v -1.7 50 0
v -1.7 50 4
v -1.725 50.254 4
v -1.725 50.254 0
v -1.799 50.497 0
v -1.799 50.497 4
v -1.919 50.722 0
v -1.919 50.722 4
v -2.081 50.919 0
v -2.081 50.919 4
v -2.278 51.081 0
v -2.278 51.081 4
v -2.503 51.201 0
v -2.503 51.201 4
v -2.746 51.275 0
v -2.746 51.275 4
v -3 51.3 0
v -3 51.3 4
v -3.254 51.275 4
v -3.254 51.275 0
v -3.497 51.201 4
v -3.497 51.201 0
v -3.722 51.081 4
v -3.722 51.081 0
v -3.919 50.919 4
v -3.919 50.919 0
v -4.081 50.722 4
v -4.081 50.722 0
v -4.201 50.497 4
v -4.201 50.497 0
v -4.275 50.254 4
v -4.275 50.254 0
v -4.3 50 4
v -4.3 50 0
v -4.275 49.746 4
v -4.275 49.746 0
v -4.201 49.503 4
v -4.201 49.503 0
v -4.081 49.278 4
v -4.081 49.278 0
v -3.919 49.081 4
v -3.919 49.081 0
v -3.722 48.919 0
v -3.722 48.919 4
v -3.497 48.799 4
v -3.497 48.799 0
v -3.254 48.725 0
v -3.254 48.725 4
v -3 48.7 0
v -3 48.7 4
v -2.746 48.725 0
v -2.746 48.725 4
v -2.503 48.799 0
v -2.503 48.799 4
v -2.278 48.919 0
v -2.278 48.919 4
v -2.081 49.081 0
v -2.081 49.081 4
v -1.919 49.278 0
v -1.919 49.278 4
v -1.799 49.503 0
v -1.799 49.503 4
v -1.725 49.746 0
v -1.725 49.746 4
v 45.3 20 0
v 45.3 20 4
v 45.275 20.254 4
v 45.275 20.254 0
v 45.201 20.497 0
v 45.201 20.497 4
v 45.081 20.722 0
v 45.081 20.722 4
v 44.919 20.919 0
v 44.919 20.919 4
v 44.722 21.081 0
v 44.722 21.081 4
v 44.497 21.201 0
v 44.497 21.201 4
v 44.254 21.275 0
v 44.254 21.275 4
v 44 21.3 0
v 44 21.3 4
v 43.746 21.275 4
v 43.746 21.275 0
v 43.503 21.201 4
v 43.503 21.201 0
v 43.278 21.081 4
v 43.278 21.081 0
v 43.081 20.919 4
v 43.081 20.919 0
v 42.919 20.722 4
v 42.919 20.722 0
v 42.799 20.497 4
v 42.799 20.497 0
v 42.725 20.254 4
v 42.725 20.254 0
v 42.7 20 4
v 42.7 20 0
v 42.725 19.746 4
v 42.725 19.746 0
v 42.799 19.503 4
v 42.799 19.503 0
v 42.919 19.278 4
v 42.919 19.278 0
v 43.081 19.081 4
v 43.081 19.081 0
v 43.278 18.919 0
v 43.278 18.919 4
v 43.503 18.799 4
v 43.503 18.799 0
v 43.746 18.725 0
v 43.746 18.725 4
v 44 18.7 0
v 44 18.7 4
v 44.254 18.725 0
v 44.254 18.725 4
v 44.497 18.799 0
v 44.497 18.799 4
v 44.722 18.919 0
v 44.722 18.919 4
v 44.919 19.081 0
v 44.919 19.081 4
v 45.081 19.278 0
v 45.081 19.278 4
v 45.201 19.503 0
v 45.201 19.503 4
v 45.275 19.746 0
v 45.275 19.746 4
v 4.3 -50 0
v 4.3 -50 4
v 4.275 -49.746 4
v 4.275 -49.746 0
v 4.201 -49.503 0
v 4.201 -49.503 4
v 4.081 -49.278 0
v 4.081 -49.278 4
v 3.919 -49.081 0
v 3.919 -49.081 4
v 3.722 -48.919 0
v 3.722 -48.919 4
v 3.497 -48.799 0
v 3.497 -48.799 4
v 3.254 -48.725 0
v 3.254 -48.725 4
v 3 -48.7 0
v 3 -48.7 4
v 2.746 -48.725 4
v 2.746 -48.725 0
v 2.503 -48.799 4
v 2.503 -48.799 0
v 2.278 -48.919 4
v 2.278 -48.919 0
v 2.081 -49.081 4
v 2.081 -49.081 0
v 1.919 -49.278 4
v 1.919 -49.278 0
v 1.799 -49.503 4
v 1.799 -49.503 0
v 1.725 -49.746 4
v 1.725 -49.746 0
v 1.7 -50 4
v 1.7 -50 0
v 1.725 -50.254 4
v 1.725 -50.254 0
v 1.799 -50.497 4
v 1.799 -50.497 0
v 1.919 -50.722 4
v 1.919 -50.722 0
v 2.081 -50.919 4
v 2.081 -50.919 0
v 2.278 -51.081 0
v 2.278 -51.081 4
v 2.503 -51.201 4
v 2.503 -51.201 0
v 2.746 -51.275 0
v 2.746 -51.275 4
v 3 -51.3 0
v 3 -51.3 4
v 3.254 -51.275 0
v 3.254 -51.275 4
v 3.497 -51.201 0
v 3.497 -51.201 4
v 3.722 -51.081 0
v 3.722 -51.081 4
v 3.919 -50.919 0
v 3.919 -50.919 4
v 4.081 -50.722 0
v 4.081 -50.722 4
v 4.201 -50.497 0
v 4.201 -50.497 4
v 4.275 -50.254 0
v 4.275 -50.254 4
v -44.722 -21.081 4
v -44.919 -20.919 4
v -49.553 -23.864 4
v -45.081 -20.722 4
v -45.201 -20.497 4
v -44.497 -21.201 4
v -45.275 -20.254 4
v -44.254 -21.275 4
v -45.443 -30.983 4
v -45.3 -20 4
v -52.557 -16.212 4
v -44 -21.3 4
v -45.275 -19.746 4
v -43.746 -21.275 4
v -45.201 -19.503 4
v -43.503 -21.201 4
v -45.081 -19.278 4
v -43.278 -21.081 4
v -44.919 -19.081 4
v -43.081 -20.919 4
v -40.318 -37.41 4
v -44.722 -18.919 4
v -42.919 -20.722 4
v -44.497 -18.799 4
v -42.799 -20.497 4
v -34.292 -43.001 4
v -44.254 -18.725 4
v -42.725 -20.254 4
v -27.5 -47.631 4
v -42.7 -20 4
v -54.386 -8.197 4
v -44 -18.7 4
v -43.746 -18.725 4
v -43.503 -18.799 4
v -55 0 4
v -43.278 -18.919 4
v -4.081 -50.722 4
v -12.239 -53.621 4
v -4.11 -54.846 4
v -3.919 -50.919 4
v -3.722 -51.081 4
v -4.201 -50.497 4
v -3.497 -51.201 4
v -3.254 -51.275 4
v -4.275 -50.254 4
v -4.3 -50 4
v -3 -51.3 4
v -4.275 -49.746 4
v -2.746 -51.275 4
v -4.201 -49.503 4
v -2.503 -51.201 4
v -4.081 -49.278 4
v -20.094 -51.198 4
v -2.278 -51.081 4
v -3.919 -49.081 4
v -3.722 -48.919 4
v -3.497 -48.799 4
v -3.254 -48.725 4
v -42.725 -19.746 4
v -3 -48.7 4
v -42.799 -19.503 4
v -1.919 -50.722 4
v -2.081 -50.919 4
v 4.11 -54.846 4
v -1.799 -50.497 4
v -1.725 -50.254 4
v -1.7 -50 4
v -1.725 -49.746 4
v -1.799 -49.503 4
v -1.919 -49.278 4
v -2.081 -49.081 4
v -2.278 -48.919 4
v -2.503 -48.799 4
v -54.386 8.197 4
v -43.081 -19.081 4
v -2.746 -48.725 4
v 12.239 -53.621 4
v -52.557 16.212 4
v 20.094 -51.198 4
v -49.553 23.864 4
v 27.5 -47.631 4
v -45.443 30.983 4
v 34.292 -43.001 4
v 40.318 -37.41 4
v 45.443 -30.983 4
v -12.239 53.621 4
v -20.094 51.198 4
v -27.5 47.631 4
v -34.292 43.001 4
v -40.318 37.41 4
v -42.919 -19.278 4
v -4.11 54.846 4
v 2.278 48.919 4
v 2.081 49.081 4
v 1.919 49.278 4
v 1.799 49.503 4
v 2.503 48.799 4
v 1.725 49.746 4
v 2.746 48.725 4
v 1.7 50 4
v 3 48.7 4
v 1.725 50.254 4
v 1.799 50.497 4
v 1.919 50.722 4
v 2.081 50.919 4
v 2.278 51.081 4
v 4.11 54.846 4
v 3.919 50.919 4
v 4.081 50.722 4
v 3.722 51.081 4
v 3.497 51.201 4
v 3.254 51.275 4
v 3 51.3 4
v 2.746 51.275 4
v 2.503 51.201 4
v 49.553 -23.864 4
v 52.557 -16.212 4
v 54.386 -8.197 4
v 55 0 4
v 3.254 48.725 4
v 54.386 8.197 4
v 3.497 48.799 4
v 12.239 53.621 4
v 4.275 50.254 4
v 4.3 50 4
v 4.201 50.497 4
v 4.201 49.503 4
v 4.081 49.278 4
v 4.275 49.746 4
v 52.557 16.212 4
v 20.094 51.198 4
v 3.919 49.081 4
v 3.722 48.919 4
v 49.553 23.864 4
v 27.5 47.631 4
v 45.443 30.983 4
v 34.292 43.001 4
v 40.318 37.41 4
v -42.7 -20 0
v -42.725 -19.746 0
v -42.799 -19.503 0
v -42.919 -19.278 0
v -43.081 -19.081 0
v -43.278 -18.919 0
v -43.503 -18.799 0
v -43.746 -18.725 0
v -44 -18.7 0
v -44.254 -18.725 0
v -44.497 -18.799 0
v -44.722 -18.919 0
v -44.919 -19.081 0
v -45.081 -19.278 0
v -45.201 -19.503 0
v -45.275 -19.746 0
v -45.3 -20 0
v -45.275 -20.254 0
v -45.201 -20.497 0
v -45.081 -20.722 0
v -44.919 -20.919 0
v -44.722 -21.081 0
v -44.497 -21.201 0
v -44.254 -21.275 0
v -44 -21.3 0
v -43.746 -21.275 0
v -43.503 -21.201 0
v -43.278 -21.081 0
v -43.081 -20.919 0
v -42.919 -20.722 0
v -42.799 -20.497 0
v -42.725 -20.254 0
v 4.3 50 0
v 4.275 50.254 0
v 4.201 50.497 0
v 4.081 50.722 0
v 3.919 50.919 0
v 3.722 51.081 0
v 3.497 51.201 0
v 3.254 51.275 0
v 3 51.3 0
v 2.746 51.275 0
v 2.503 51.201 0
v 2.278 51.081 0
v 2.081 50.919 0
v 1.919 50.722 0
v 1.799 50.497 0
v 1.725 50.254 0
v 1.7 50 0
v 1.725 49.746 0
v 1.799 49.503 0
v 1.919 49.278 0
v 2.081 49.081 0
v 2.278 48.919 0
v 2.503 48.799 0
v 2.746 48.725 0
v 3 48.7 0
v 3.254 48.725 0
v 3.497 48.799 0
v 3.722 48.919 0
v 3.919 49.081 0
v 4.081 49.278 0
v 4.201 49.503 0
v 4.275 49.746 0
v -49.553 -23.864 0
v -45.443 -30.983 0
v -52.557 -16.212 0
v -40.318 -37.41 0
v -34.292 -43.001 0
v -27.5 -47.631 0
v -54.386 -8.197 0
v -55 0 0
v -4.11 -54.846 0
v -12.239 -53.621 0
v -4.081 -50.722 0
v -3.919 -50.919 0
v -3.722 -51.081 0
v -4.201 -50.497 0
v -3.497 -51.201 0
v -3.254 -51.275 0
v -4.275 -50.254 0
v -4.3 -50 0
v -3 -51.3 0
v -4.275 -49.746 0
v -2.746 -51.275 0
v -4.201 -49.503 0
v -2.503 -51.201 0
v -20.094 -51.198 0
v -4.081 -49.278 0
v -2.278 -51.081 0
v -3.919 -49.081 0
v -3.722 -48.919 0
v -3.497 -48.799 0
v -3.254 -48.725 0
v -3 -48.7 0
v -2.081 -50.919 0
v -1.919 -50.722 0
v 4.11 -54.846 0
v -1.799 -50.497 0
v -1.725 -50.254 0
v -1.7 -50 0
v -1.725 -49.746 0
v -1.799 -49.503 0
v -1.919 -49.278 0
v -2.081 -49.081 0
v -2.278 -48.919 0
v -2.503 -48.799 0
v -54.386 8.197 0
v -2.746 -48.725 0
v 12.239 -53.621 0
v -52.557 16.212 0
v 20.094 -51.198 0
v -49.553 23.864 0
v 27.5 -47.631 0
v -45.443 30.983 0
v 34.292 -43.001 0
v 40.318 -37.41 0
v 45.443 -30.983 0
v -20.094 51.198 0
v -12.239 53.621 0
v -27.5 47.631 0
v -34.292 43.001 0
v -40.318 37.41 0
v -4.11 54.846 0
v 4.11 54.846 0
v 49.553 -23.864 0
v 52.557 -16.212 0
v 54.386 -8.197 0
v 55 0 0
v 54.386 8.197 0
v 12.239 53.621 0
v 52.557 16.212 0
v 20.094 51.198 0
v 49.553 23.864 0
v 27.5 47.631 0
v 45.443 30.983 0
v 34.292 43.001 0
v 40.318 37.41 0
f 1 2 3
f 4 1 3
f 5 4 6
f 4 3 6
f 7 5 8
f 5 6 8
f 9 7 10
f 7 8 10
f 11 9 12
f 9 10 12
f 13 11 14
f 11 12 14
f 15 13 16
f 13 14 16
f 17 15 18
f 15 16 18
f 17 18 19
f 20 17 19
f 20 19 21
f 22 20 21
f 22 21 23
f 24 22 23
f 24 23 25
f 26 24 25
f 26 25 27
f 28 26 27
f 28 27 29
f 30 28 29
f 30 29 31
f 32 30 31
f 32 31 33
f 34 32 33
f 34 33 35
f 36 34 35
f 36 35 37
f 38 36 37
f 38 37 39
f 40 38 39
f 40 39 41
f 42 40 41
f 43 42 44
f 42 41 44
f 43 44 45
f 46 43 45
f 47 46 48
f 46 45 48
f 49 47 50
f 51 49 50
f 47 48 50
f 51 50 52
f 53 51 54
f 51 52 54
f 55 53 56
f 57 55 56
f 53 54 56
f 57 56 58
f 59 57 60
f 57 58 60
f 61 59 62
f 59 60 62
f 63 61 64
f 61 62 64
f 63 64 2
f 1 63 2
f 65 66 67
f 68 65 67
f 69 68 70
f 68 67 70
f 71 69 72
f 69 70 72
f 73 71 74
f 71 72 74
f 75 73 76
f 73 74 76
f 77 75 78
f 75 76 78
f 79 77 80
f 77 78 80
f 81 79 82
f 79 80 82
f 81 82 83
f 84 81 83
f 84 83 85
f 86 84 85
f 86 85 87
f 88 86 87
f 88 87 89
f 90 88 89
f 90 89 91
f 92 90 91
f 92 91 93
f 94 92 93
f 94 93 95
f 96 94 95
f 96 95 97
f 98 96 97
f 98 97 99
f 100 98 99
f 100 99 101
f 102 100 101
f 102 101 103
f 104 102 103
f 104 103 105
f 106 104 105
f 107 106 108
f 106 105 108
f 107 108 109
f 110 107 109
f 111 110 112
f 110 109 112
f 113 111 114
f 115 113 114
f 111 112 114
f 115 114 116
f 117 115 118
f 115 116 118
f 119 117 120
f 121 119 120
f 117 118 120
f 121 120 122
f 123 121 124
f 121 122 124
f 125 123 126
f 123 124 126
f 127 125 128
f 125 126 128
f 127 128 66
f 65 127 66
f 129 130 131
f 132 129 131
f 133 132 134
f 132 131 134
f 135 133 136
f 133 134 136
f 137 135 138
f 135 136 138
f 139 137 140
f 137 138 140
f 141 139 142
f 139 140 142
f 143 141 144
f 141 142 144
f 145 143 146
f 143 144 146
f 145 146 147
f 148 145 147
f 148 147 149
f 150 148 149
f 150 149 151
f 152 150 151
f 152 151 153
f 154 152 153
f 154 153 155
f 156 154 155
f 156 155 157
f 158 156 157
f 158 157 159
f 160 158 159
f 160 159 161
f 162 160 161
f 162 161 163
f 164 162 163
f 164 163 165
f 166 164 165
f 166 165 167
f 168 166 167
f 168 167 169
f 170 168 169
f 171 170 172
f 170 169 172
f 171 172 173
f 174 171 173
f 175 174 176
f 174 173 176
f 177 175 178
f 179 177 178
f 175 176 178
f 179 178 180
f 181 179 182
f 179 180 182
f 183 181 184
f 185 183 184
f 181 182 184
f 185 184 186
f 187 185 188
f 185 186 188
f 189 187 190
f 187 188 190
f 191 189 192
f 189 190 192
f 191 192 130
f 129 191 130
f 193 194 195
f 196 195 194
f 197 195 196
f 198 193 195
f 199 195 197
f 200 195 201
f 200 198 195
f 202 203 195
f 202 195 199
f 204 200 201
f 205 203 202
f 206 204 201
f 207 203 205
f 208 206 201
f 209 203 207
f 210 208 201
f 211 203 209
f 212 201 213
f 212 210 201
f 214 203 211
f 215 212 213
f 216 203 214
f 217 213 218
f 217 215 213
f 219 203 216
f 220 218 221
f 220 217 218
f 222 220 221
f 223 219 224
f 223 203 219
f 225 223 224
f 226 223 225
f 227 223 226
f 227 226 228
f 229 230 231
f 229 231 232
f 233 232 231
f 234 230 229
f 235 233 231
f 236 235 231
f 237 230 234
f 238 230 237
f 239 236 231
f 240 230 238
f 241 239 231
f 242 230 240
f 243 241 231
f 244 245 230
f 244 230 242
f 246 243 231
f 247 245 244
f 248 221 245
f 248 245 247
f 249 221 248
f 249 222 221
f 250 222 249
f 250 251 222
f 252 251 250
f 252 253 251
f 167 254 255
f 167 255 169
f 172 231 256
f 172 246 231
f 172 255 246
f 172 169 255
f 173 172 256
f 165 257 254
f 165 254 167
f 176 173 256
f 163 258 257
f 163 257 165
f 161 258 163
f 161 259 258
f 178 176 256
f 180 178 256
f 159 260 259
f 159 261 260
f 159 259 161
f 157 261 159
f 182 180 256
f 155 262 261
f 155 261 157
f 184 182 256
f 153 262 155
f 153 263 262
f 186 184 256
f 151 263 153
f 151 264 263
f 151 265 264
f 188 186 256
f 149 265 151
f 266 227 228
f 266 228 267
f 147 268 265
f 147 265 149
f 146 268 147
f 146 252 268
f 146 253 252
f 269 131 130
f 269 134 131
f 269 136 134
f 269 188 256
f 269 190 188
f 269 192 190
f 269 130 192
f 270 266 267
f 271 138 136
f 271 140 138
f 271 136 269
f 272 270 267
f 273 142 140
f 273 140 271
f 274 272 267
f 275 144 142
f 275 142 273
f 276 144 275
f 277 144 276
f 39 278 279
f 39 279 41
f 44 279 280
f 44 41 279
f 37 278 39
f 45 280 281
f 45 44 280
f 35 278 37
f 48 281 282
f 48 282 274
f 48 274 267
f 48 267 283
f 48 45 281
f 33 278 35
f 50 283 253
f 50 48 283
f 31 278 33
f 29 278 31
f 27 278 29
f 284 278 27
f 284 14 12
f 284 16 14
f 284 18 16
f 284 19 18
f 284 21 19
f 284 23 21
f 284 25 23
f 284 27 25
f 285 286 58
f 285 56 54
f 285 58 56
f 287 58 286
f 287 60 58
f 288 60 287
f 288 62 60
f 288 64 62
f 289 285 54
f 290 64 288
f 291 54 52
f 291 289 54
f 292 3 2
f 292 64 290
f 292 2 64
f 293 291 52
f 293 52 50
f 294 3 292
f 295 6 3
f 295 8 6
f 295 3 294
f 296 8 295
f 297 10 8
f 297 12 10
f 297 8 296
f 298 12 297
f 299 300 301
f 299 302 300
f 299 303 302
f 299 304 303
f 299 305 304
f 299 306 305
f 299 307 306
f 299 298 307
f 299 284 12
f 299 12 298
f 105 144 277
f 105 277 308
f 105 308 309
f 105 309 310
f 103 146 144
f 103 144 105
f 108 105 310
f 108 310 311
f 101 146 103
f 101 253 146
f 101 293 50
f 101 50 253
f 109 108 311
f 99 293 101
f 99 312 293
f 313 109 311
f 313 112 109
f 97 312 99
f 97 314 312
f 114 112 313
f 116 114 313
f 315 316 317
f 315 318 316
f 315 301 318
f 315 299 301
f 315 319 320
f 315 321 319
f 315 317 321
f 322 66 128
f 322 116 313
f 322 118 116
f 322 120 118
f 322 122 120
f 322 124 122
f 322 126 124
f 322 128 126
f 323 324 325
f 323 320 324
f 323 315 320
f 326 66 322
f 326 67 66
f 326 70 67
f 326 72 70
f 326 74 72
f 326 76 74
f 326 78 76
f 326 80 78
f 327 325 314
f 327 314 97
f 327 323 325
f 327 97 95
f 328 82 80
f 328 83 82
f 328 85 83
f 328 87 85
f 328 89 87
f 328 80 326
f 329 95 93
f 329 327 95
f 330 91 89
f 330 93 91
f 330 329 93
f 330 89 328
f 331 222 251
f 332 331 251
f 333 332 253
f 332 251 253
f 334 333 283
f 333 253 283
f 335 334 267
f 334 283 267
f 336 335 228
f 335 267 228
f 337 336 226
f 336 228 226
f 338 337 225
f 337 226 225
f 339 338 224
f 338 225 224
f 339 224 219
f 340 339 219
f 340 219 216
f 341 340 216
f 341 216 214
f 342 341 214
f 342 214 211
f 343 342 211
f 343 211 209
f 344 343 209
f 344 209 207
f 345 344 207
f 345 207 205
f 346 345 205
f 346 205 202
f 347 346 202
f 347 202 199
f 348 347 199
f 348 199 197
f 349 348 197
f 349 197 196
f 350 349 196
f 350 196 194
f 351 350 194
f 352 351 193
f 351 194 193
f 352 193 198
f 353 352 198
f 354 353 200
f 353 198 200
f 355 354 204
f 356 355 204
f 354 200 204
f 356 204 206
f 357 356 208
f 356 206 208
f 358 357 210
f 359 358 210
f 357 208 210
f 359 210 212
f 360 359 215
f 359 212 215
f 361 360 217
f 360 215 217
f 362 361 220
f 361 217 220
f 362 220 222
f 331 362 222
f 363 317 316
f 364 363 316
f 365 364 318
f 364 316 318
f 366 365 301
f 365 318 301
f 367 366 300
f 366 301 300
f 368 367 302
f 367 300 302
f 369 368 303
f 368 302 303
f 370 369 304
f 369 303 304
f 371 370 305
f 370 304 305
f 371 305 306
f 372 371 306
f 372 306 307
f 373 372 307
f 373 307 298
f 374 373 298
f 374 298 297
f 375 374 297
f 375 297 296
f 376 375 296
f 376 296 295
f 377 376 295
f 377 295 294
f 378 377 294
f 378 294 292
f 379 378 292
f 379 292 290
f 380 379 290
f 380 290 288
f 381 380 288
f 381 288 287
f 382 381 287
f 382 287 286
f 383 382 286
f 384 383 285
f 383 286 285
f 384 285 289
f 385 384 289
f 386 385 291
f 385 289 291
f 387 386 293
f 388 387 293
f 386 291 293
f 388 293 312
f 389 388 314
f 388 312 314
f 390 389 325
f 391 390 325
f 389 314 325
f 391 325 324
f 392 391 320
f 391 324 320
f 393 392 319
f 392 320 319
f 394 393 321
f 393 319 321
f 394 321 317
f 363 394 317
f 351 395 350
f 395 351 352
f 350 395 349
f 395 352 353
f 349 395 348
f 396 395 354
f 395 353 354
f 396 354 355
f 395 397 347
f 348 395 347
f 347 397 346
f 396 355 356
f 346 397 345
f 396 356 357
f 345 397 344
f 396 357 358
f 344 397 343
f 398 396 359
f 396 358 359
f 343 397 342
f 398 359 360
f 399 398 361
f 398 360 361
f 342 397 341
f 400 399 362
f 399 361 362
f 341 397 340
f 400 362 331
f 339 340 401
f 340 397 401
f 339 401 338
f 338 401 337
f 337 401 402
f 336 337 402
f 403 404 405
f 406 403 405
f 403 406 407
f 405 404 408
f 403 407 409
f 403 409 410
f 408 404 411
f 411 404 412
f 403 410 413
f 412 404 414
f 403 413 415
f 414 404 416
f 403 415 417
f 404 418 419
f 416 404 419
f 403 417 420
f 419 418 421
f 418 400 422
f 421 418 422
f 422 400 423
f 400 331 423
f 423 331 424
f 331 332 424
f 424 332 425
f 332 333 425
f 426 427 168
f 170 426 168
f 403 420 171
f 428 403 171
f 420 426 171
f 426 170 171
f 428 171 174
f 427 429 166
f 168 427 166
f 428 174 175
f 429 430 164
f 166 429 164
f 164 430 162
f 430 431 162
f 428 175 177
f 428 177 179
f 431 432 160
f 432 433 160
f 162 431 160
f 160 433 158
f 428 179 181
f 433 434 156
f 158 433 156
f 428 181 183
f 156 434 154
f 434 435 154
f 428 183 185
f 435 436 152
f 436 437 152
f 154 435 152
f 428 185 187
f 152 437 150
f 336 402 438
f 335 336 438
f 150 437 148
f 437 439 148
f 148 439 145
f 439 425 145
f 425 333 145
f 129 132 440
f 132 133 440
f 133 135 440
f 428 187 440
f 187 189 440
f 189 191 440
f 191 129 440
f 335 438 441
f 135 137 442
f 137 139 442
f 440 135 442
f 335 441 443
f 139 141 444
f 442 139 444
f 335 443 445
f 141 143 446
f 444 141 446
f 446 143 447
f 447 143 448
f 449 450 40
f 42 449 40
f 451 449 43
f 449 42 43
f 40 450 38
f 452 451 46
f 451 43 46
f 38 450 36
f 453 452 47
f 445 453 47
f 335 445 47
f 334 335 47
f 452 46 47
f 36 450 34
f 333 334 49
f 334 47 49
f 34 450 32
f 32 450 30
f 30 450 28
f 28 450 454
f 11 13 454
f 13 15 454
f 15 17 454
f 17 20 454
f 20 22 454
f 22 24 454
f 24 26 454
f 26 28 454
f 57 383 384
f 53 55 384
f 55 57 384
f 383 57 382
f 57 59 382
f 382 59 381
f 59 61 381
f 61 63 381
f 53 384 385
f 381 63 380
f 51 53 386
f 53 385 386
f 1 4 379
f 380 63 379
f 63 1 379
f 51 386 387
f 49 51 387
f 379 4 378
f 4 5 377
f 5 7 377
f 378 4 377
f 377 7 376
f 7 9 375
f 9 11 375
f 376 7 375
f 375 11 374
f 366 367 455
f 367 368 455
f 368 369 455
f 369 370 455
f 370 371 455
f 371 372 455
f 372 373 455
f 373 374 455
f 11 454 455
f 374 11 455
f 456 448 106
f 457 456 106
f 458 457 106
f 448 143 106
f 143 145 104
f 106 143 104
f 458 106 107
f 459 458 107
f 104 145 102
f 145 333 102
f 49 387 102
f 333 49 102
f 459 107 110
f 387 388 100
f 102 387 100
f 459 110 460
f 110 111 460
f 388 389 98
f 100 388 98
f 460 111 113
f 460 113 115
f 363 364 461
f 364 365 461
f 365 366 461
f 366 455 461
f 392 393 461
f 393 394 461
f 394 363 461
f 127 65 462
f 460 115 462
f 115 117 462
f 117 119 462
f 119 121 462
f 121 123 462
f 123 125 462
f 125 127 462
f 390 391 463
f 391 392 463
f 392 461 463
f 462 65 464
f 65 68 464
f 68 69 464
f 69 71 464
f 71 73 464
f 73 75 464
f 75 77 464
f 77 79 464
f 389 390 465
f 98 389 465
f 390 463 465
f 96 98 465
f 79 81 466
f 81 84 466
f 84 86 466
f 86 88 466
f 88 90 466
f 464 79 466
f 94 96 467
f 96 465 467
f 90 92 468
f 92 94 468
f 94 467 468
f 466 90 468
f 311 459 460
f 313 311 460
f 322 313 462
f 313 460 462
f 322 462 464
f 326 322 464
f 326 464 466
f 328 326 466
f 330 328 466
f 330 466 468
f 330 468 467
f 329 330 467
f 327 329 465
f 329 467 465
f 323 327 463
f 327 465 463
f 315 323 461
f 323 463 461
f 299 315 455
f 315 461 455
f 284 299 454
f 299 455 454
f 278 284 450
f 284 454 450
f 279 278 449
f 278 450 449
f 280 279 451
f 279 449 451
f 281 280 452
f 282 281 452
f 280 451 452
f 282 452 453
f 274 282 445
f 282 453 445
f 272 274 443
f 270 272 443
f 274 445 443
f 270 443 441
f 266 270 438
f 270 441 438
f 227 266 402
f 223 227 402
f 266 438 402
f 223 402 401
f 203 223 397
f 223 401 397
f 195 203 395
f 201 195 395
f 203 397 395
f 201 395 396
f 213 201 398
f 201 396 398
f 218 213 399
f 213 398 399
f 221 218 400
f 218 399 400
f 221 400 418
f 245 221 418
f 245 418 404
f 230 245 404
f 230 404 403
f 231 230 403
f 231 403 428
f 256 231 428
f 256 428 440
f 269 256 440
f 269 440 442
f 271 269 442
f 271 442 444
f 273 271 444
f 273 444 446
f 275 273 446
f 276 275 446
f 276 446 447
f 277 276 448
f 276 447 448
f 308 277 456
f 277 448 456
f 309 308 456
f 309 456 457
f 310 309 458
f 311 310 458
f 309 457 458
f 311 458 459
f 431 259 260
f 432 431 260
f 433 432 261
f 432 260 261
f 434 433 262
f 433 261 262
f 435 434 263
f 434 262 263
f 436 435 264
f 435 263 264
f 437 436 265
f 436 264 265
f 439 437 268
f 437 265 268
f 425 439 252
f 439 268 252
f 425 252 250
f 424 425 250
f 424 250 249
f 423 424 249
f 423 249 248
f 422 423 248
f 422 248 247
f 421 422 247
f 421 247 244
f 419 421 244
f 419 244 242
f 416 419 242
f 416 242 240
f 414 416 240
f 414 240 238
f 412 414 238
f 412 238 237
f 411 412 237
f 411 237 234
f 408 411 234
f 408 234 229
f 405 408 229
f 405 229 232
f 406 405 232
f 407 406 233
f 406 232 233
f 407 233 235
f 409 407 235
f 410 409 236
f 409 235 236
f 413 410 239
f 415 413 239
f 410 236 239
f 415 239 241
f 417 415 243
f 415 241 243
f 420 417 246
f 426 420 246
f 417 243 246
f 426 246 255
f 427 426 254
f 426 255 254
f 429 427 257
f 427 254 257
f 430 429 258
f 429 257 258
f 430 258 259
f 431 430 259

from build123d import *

# Parameters (mm, degrees)
SKETCH_R        = 55
PAD_DEPTH       = 4
SKETCH003_R     = 1.3
POCKET001_DEPTH = 5
SKETCH004_R     = 1.3
POCKET_DEPTH    = 5


with BuildPart() as part:
    # Sketch → Pad (new body)
    with BuildSketch(Plane.XY):
        Circle(SKETCH_R)
    extrude(amount=PAD_DEPTH)

    # Sketch003 → Pocket001 (cut)
    with BuildSketch(Plane.XY.offset(4)):
        with Locations((-44, -20)):
            Circle(SKETCH003_R)
        with Locations((44, 20)):
            Circle(SKETCH003_R)
    extrude(amount=-POCKET001_DEPTH, mode=Mode.SUBTRACT)

    # Sketch004 (on Face3 of Pocket001) → Pocket (cut)
    with BuildSketch(Plane.XY.offset(4)):
        with Locations((3, -50)):
            Circle(SKETCH004_R)
        with Locations((-3, -50)):
            Circle(SKETCH004_R)
        with Locations((-3, 50)):
            Circle(SKETCH004_R)
        with Locations((3, 50)):
            Circle(SKETCH004_R)
    extrude(amount=-POCKET_DEPTH, mode=Mode.SUBTRACT)


solid = part.part
